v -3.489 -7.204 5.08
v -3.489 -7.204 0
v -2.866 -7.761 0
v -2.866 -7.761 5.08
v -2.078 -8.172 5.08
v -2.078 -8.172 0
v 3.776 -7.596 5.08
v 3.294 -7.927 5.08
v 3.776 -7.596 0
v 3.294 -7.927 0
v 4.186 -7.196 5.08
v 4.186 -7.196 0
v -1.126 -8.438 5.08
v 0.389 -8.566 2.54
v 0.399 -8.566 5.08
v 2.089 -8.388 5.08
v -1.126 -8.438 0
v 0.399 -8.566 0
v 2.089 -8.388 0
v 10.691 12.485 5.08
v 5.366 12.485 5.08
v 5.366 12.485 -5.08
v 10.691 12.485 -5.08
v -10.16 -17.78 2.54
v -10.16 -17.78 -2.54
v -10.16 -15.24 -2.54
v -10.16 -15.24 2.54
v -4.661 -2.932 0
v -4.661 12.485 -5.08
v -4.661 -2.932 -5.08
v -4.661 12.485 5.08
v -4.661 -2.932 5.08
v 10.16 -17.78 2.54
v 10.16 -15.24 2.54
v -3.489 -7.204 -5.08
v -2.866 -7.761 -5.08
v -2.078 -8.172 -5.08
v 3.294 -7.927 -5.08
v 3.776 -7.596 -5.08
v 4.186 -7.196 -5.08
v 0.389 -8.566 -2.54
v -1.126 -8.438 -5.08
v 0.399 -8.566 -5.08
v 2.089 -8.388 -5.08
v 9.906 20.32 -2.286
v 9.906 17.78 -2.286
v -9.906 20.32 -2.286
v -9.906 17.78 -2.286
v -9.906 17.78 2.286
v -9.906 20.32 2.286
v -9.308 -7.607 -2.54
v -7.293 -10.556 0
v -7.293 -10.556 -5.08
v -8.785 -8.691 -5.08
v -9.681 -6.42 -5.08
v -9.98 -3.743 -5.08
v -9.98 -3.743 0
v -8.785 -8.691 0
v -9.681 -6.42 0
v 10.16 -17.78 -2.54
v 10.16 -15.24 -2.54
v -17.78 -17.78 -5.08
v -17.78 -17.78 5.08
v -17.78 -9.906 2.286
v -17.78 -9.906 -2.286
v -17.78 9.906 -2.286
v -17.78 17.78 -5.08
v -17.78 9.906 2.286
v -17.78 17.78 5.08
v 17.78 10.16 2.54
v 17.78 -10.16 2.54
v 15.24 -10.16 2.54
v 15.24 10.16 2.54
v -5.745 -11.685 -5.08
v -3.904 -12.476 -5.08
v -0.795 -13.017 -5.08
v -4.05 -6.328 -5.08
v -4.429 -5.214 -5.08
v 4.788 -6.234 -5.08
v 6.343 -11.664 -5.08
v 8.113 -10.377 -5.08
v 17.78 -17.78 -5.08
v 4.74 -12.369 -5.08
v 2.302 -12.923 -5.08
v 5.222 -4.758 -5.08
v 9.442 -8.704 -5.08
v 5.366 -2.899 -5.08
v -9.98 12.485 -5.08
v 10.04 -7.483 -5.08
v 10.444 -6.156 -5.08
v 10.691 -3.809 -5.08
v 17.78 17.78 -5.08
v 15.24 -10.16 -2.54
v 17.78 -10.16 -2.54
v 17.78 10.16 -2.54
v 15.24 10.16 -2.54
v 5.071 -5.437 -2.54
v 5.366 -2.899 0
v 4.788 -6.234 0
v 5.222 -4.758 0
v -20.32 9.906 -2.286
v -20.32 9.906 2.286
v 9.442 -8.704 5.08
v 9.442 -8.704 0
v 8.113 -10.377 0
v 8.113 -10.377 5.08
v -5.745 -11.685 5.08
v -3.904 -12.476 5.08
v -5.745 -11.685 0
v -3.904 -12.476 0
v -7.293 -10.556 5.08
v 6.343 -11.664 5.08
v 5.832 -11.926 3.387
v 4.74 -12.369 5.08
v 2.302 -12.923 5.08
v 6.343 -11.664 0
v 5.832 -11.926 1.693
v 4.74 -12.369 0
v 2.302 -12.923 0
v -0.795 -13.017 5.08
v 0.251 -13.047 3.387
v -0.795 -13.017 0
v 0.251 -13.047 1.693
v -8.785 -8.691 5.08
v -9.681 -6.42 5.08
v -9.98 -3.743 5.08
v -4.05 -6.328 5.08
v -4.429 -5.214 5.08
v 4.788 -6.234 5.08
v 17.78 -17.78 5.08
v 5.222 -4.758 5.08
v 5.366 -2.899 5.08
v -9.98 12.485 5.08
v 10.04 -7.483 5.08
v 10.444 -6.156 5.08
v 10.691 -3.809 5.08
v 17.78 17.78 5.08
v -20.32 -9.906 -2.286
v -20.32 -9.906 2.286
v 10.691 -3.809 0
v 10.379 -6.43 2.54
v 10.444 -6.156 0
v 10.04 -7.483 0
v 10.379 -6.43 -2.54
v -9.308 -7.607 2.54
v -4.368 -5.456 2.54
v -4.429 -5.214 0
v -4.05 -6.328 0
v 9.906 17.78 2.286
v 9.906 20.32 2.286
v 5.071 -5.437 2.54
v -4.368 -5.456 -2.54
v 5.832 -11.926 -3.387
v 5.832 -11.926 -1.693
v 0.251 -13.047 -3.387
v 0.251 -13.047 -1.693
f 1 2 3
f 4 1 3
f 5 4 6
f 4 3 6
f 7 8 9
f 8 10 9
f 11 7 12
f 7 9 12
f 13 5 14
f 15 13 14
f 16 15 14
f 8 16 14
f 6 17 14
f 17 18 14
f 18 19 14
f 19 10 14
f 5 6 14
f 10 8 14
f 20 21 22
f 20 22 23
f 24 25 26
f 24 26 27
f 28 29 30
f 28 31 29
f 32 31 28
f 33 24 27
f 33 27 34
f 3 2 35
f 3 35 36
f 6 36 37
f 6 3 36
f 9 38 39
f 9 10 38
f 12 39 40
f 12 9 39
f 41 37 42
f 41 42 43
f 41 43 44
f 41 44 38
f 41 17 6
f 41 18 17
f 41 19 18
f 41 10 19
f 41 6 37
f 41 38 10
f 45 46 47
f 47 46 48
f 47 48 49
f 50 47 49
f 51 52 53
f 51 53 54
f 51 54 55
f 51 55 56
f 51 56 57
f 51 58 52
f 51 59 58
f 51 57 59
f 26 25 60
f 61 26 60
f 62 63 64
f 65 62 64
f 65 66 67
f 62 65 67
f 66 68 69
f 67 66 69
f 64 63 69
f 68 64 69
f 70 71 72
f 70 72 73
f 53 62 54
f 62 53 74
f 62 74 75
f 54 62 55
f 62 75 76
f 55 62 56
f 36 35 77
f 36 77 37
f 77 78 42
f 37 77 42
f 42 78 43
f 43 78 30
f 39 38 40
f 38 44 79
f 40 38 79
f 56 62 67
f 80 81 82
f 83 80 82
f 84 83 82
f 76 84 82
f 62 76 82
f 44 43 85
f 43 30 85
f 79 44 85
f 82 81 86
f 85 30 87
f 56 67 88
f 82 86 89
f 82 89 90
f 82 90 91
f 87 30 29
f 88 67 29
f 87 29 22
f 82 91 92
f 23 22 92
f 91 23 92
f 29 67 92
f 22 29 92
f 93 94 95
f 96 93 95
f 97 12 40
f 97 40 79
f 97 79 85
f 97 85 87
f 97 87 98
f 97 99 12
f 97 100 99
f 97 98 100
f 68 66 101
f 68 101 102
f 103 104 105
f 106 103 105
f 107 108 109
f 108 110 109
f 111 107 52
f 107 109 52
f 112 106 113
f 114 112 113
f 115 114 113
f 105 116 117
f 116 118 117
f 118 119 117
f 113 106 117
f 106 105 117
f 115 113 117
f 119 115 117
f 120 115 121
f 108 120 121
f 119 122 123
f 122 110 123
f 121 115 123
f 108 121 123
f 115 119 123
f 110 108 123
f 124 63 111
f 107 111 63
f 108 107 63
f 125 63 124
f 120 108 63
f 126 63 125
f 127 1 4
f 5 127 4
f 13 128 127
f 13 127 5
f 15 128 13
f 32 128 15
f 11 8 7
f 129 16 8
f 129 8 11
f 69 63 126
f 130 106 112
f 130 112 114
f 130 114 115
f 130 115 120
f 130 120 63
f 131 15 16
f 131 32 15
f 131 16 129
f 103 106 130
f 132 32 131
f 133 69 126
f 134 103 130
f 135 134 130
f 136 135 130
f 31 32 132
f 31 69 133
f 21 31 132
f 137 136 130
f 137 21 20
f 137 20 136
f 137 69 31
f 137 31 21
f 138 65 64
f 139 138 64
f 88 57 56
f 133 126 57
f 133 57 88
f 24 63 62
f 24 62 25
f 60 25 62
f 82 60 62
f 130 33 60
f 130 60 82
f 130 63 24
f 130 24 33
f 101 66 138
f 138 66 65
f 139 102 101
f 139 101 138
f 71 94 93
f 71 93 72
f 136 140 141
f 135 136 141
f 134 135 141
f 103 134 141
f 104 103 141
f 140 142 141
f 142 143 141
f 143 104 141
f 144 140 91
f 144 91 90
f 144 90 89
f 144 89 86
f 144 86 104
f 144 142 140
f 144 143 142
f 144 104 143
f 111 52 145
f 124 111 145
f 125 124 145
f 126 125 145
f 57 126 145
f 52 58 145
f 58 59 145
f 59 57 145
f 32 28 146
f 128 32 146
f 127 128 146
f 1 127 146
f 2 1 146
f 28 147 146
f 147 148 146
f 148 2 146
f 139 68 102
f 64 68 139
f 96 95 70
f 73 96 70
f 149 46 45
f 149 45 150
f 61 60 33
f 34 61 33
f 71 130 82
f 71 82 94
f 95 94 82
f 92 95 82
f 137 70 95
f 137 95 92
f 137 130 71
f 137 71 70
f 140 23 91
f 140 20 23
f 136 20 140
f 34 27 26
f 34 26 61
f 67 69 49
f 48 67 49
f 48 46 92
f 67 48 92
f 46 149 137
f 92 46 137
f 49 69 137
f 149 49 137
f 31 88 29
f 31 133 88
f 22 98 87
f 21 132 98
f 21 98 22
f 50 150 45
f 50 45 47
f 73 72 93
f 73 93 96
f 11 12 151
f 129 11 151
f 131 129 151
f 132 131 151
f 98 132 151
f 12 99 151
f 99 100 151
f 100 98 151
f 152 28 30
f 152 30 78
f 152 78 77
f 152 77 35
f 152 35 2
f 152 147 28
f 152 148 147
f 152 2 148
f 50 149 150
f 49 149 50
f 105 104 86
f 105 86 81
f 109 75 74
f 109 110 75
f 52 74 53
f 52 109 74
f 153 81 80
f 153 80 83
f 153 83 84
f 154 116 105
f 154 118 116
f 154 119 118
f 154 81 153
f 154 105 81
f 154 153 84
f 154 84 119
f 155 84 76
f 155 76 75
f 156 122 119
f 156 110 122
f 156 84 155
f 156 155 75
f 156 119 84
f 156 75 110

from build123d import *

# Parameters (mm, degrees)
F0_W     = 35.56
F0_H     = 35.56
F1_DEPTH = 5.08
F2_W     = 19.812
F2_H     = 4.572
F3_DEPTH = 2.54
F4_W     = 19.812
F4_H     = 4.572
F5_DEPTH = 2.54
F6_W     = 20.32
F6_H     = 5.08
F7_DEPTH = 2.54
F8_W     = 20.32
F8_H     = 5.08
F9_DEPTH = 2.54


with BuildPart() as f1:
    # F0 (on Top) → F1 (new body, symmetric)
    with BuildSketch(Plane.XY):
        Rectangle(F0_W, F0_H)
        with BuildLine():
            Line((5.3660807292, 12.4850260417), (10.6908203125, 12.4850260417))
            Line((10.6908203125, 12.4850260417), (10.6908203125, -3.8088975694))
            add(Edge.make_bspline(
                [(10.6908203125, -3.8088975694), (10.6908203125, -6.6035590278), (9.4423177083, -8.7036892361)],
                knots=[0, 0, 0, 1, 1, 1], degree=2))
            add(Edge.make_bspline(
                [(9.4423177083, -8.7036892361), (8.1938151042, -10.8038194444), (5.8318576389, -11.9255425347)],
                knots=[0, 0, 0, 1, 1, 1], degree=2))
            add(Edge.make_bspline(
                [(5.8318576389, -11.9255425347), (3.4699001736, -13.047265625), (0.2508029514, -13.047265625)],
                knots=[0, 0, 0, 1, 1, 1], degree=2))
            add(Edge.make_bspline(
                [(0.2508029514, -13.047265625), (-4.6054036458, -13.047265625), (-7.292578125, -10.5557725694)],
                knots=[0, 0, 0, 1, 1, 1], degree=2))
            add(Edge.make_bspline(
                [(-7.292578125, -10.5557725694), (-9.9797526042, -8.0642795139), (-9.9797526042, -3.7427517361)],
                knots=[0, 0, 0, 1, 1, 1], degree=2))
            Line((-9.9797526042, -3.7427517361), (-9.9797526042, 12.4850260417))
            Line((-9.9797526042, 12.4850260417), (-4.6605251736, 12.4850260417))
            Line((-4.6605251736, 12.4850260417), (-4.6605251736, -2.9324652778))
            add(Edge.make_bspline(
                [(-4.6605251736, -2.9324652778), (-4.6605251736, -5.8428819444), (-3.4891927083, -7.2043836806)],
                knots=[0, 0, 0, 1, 1, 1], degree=2))
            add(Edge.make_bspline(
                [(-3.4891927083, -7.2043836806), (-2.3178602431, -8.5658854167), (0.3886067708, -8.5658854167)],
                knots=[0, 0, 0, 1, 1, 1], degree=2))
            add(Edge.make_bspline(
                [(0.3886067708, -8.5658854167), (3.0068793403, -8.5658854167), (4.1864800347, -7.1961154514)],
                knots=[0, 0, 0, 1, 1, 1], degree=2))
            add(Edge.make_bspline(
                [(4.1864800347, -7.1961154514), (5.3660807292, -5.8263454861), (5.3660807292, -2.8993923611)],
                knots=[0, 0, 0, 1, 1, 1], degree=2))
            Line((5.3660807292, -2.8993923611), (5.3660807292, 12.4850260417))
        make_face(mode=Mode.SUBTRACT)
    extrude(amount=F1_DEPTH, both=True)

    # F2 (on face) → F3 (join)
    with BuildSketch(Plane(origin=(0, 17.78, 0), x_dir=(-1, 0, 0), z_dir=(0, 1, 0))):
        Rectangle(F2_W, F2_H)
    extrude(amount=F3_DEPTH)

    # F4 (on face) → F5 (join)
    with BuildSketch(Plane(origin=(-17.78, 0, 0), x_dir=(0, -1, 0), z_dir=(-1, 0, 0))):
        Rectangle(F4_W, F4_H)
    extrude(amount=F5_DEPTH)

    # F6 (on face) → F7 (cut)
    with BuildSketch(Plane.XZ.offset(17.78)):
        Rectangle(F6_W, F6_H)
    extrude(amount=-F7_DEPTH, mode=Mode.SUBTRACT)

    # F8 (on face) → F9 (cut)
    with BuildSketch(Plane.YZ.offset(17.78)):
        Rectangle(F8_W, F8_H)
    extrude(amount=-F9_DEPTH, mode=Mode.SUBTRACT)


solid = f1.part
